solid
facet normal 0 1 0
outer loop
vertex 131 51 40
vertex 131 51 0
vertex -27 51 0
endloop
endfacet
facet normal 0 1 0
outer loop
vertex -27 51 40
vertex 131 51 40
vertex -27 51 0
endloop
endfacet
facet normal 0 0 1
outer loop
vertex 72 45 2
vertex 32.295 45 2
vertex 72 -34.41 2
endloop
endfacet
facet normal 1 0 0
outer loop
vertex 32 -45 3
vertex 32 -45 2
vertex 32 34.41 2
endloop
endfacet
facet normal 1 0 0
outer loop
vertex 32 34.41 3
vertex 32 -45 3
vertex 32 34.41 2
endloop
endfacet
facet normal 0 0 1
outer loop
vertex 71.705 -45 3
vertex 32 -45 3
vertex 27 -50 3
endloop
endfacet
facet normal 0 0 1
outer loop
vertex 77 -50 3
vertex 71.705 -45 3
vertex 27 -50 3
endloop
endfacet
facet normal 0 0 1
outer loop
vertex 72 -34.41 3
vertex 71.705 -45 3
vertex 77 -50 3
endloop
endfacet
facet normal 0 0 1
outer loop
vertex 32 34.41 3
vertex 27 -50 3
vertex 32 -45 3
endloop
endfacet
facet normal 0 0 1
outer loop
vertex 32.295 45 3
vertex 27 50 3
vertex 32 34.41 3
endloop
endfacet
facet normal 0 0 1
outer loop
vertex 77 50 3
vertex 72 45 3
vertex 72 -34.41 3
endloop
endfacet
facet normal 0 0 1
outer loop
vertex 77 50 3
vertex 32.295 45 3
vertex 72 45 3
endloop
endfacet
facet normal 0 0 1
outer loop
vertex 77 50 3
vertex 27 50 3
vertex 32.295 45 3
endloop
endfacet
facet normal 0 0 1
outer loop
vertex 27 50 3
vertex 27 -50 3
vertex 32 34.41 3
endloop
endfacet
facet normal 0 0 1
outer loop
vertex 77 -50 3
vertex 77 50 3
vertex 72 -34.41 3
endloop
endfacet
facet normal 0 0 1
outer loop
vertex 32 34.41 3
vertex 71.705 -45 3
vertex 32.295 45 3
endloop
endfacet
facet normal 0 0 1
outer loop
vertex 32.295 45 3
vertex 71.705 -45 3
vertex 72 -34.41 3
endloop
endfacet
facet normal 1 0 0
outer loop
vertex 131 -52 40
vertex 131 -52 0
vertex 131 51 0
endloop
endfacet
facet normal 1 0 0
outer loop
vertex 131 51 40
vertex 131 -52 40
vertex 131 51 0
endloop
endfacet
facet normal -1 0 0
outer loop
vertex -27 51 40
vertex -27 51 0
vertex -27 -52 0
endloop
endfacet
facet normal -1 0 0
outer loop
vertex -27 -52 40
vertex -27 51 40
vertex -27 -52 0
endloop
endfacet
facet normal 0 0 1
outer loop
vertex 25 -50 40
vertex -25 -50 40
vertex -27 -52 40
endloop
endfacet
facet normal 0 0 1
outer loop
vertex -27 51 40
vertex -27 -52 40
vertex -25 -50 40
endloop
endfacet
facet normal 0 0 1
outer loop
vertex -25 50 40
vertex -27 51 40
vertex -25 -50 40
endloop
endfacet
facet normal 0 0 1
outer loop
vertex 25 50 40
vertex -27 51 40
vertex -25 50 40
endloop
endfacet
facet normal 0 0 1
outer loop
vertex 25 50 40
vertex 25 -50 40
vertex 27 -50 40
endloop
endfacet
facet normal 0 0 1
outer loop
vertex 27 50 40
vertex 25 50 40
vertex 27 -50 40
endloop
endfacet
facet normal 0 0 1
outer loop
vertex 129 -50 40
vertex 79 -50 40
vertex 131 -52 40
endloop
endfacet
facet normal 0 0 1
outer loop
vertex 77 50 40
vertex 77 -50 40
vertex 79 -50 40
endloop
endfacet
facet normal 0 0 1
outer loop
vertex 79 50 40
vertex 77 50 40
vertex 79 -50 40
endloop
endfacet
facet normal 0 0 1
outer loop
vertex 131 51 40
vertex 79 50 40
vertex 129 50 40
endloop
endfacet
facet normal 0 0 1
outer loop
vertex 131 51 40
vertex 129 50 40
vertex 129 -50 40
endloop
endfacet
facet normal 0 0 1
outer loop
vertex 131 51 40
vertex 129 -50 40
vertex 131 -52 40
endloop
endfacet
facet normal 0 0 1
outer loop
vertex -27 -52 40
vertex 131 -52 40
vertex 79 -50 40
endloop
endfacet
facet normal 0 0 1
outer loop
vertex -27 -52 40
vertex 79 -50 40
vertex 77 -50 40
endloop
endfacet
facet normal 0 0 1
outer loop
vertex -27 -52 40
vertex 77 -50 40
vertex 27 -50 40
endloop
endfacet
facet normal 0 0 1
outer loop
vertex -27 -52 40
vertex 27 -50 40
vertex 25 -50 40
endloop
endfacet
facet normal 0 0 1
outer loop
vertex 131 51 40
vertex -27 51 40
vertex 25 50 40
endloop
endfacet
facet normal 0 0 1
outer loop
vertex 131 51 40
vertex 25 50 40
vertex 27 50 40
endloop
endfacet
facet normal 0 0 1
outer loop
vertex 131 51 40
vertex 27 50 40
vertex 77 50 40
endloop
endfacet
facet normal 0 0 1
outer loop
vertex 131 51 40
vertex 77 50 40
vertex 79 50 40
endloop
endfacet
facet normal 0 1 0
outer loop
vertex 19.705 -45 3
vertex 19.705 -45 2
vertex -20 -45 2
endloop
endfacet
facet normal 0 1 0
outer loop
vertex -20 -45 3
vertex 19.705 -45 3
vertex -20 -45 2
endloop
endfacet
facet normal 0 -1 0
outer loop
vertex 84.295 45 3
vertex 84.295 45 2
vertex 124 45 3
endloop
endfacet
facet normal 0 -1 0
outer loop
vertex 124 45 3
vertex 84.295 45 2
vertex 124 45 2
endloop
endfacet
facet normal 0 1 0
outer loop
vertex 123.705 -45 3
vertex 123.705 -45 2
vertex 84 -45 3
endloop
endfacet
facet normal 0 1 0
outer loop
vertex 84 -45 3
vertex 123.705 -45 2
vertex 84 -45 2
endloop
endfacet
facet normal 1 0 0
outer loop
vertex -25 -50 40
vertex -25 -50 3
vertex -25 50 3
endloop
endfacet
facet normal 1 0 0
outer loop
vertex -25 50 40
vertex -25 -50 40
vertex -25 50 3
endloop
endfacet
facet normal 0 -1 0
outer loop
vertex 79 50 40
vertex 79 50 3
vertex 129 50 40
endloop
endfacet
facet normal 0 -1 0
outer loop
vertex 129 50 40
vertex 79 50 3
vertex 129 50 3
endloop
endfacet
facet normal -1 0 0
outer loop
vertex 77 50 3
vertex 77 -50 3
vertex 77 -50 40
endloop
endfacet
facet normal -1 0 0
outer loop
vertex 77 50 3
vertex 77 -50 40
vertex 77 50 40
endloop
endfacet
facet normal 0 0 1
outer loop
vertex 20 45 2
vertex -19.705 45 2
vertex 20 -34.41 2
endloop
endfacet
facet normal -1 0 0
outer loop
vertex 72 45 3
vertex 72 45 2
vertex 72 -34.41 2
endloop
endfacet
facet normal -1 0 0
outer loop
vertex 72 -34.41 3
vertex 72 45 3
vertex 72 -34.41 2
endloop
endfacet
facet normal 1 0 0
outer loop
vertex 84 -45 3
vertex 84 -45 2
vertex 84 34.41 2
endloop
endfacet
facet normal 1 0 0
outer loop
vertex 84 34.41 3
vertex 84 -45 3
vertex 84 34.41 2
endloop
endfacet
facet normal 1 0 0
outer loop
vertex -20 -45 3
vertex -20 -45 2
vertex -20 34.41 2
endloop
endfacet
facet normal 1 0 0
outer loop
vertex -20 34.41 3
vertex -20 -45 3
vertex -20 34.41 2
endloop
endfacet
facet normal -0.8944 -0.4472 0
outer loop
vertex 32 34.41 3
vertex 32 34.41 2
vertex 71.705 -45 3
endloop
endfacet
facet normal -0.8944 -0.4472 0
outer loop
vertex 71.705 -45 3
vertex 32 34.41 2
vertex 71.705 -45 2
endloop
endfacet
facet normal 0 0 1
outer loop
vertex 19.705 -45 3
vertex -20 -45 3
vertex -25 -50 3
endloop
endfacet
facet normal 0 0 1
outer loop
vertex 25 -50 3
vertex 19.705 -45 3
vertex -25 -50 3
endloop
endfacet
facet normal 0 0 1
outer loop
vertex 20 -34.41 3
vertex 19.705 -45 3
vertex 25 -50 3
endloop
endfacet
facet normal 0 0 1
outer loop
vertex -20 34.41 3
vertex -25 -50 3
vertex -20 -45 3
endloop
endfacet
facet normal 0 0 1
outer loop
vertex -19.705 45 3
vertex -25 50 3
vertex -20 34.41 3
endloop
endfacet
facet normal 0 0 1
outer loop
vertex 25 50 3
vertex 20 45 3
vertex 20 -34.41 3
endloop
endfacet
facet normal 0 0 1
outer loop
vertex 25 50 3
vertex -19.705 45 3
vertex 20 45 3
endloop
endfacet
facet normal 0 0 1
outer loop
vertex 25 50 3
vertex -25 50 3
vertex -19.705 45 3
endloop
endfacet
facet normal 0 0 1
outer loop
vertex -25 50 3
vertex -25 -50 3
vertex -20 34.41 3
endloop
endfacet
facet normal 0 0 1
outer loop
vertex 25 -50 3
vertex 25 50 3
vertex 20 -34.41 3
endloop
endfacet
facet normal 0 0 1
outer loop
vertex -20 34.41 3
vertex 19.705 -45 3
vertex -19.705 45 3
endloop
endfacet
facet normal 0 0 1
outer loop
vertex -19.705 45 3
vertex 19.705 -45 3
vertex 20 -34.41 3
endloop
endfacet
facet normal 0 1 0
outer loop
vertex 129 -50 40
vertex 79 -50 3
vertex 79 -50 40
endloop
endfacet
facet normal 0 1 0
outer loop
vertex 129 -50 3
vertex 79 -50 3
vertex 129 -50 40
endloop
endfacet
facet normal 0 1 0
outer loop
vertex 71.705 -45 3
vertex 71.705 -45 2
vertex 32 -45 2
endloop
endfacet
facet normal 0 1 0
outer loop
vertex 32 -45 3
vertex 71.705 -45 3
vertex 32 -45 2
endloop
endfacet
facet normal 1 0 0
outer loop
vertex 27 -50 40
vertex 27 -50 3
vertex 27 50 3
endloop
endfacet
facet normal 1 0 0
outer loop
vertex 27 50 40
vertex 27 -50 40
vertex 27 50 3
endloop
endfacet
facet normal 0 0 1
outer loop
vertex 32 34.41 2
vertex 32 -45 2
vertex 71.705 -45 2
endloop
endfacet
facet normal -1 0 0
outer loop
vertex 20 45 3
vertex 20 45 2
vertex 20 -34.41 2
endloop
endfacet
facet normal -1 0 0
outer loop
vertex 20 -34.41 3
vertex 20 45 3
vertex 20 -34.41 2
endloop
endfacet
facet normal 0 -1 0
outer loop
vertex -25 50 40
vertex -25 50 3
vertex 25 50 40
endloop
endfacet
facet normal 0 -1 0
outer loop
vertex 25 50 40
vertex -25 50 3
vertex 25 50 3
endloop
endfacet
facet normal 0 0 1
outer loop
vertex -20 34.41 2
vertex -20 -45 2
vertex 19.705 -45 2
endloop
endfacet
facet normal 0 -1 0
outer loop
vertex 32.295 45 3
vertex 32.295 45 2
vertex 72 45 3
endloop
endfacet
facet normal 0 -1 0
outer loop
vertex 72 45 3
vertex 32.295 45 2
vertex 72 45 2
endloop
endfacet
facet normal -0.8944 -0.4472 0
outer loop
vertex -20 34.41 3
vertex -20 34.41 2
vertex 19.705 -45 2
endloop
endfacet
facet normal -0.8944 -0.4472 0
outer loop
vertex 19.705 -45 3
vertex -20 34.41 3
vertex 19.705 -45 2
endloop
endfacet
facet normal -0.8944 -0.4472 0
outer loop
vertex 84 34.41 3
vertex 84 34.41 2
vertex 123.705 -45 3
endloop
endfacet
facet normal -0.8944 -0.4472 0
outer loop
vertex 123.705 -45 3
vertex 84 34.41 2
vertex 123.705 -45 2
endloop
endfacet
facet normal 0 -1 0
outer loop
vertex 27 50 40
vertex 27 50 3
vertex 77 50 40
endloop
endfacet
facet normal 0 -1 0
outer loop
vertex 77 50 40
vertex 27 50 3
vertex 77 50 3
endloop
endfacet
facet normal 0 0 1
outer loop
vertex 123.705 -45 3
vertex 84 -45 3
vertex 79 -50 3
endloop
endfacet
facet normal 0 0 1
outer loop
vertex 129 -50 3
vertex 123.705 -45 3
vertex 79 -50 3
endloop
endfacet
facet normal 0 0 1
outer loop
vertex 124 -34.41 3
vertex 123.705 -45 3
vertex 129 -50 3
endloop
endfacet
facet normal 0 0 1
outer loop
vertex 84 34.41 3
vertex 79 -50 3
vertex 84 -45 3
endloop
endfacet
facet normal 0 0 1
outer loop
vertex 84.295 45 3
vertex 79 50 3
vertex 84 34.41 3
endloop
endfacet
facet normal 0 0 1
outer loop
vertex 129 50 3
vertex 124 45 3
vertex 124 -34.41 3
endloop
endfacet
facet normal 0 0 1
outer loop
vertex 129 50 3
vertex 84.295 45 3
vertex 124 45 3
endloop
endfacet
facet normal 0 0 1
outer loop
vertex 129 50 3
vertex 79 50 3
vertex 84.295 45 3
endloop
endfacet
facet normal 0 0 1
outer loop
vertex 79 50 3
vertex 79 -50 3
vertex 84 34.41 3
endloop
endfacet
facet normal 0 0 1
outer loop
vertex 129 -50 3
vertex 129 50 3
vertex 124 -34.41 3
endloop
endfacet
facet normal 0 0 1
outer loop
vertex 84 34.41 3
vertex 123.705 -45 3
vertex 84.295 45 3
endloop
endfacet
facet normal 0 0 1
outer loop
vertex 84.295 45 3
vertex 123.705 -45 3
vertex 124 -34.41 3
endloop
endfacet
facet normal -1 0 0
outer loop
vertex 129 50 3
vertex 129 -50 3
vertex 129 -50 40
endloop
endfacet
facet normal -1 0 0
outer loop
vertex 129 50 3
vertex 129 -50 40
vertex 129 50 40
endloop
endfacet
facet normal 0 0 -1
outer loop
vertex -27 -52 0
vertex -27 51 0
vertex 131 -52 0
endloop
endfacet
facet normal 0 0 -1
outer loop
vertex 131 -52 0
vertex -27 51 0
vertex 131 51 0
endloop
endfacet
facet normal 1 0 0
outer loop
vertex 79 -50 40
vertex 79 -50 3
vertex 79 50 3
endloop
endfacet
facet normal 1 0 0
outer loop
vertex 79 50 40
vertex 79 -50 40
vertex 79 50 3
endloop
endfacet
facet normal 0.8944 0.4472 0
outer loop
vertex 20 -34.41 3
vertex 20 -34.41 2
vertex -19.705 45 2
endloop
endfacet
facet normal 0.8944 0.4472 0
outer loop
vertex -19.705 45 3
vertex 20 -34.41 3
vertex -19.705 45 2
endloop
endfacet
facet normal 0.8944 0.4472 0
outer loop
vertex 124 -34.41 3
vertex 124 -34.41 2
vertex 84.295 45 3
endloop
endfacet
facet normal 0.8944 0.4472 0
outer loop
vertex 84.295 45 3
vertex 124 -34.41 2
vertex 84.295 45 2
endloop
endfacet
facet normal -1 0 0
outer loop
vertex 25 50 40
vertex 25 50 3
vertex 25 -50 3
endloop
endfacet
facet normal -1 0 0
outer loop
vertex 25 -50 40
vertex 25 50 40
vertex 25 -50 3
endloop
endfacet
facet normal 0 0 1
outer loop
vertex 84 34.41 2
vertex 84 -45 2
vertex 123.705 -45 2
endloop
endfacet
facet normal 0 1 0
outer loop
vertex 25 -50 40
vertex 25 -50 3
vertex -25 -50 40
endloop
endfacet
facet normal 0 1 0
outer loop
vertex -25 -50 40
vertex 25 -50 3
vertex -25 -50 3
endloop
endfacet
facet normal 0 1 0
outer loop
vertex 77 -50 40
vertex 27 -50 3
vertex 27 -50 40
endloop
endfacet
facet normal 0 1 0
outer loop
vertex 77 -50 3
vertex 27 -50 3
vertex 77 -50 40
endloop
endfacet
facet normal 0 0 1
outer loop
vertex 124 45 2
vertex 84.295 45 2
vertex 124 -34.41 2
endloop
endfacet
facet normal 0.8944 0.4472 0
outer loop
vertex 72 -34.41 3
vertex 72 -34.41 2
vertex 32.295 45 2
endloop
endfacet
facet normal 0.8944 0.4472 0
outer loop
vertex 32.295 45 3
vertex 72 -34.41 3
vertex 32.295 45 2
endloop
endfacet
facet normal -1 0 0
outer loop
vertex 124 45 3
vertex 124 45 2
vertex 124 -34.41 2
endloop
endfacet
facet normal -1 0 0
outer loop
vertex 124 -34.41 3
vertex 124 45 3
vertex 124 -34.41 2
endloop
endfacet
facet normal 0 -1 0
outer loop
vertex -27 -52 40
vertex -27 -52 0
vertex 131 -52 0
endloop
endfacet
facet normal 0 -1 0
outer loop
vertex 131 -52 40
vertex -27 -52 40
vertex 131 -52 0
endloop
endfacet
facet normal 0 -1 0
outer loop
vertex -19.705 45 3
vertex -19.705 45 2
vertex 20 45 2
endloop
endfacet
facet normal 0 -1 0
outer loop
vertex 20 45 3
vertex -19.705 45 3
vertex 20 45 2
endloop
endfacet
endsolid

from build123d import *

# Parameters (mm, degrees)
F0_W     = 50
F0_H     = 100
F0_H_2   = 1
F1_DEPTH = 40
F2_DEPTH = 3
F3_DEPTH = 2


with BuildPart() as f1:
    # F0 (on Top) → F1 (new body)
    with BuildSketch(Plane.XY):
        Polygon((-25, -50), (-25, 50), (-25, 51), (-27, 51), (-27, -52), (131, -52), (131, 51), (25, 51), (25, 50), (25, -50), align=None)
        with Locations((52, 0)):
            Rectangle(F0_W, F0_H, mode=Mode.SUBTRACT)
        with Locations((104, 0)):
            Rectangle(F0_W, F0_H, mode=Mode.SUBTRACT)
        with Locations((0, 50.5)):
            Rectangle(F0_W, F0_H_2)
    extrude(amount=F1_DEPTH)

    # F0 (on Top) → F2 (join)
    with BuildSketch(Plane.XY):
        Rectangle(F0_W, F0_H)
        Polygon((-20, -45), (-20, 34.40983), (19.704915, -45), align=None, mode=Mode.SUBTRACT)
        Polygon((20, -34.40983), (-19.704915, 45), (20, 45), align=None, mode=Mode.SUBTRACT)
        with Locations((52, 0)):
            Rectangle(F0_W, F0_H)
        Polygon((32, 34.40983), (71.704915, -45), (32, -45), align=None, mode=Mode.SUBTRACT)
        Polygon((72, -34.40983), (32.295085, 45), (72, 45), align=None, mode=Mode.SUBTRACT)
        with Locations((104, 0)):
            Rectangle(F0_W, F0_H)
        Polygon((84, 34.40983), (123.704915, -45), (84, -45), align=None, mode=Mode.SUBTRACT)
        Polygon((124, -34.40983), (84.295085, 45), (124, 45), align=None, mode=Mode.SUBTRACT)
    extrude(amount=F2_DEPTH)

    # F0 (on Top) → F3 (join)
    with BuildSketch(Plane.XY):
        Polygon((20, 45), (-19.704915, 45), (20, -34.40983), align=None)
        Polygon((19.704915, -45), (-20, 34.40983), (-20, -45), align=None)
        Polygon((32, -45), (71.704915, -45), (32, 34.40983), align=None)
        Polygon((72, 45), (32.295085, 45), (72, -34.40983), align=None)
        Polygon((124, 45), (84.295085, 45), (124, -34.40983), align=None)
        Polygon((84, -45), (123.704915, -45), (84, 34.40983), align=None)
    extrude(amount=F3_DEPTH)


solid = f1.part
